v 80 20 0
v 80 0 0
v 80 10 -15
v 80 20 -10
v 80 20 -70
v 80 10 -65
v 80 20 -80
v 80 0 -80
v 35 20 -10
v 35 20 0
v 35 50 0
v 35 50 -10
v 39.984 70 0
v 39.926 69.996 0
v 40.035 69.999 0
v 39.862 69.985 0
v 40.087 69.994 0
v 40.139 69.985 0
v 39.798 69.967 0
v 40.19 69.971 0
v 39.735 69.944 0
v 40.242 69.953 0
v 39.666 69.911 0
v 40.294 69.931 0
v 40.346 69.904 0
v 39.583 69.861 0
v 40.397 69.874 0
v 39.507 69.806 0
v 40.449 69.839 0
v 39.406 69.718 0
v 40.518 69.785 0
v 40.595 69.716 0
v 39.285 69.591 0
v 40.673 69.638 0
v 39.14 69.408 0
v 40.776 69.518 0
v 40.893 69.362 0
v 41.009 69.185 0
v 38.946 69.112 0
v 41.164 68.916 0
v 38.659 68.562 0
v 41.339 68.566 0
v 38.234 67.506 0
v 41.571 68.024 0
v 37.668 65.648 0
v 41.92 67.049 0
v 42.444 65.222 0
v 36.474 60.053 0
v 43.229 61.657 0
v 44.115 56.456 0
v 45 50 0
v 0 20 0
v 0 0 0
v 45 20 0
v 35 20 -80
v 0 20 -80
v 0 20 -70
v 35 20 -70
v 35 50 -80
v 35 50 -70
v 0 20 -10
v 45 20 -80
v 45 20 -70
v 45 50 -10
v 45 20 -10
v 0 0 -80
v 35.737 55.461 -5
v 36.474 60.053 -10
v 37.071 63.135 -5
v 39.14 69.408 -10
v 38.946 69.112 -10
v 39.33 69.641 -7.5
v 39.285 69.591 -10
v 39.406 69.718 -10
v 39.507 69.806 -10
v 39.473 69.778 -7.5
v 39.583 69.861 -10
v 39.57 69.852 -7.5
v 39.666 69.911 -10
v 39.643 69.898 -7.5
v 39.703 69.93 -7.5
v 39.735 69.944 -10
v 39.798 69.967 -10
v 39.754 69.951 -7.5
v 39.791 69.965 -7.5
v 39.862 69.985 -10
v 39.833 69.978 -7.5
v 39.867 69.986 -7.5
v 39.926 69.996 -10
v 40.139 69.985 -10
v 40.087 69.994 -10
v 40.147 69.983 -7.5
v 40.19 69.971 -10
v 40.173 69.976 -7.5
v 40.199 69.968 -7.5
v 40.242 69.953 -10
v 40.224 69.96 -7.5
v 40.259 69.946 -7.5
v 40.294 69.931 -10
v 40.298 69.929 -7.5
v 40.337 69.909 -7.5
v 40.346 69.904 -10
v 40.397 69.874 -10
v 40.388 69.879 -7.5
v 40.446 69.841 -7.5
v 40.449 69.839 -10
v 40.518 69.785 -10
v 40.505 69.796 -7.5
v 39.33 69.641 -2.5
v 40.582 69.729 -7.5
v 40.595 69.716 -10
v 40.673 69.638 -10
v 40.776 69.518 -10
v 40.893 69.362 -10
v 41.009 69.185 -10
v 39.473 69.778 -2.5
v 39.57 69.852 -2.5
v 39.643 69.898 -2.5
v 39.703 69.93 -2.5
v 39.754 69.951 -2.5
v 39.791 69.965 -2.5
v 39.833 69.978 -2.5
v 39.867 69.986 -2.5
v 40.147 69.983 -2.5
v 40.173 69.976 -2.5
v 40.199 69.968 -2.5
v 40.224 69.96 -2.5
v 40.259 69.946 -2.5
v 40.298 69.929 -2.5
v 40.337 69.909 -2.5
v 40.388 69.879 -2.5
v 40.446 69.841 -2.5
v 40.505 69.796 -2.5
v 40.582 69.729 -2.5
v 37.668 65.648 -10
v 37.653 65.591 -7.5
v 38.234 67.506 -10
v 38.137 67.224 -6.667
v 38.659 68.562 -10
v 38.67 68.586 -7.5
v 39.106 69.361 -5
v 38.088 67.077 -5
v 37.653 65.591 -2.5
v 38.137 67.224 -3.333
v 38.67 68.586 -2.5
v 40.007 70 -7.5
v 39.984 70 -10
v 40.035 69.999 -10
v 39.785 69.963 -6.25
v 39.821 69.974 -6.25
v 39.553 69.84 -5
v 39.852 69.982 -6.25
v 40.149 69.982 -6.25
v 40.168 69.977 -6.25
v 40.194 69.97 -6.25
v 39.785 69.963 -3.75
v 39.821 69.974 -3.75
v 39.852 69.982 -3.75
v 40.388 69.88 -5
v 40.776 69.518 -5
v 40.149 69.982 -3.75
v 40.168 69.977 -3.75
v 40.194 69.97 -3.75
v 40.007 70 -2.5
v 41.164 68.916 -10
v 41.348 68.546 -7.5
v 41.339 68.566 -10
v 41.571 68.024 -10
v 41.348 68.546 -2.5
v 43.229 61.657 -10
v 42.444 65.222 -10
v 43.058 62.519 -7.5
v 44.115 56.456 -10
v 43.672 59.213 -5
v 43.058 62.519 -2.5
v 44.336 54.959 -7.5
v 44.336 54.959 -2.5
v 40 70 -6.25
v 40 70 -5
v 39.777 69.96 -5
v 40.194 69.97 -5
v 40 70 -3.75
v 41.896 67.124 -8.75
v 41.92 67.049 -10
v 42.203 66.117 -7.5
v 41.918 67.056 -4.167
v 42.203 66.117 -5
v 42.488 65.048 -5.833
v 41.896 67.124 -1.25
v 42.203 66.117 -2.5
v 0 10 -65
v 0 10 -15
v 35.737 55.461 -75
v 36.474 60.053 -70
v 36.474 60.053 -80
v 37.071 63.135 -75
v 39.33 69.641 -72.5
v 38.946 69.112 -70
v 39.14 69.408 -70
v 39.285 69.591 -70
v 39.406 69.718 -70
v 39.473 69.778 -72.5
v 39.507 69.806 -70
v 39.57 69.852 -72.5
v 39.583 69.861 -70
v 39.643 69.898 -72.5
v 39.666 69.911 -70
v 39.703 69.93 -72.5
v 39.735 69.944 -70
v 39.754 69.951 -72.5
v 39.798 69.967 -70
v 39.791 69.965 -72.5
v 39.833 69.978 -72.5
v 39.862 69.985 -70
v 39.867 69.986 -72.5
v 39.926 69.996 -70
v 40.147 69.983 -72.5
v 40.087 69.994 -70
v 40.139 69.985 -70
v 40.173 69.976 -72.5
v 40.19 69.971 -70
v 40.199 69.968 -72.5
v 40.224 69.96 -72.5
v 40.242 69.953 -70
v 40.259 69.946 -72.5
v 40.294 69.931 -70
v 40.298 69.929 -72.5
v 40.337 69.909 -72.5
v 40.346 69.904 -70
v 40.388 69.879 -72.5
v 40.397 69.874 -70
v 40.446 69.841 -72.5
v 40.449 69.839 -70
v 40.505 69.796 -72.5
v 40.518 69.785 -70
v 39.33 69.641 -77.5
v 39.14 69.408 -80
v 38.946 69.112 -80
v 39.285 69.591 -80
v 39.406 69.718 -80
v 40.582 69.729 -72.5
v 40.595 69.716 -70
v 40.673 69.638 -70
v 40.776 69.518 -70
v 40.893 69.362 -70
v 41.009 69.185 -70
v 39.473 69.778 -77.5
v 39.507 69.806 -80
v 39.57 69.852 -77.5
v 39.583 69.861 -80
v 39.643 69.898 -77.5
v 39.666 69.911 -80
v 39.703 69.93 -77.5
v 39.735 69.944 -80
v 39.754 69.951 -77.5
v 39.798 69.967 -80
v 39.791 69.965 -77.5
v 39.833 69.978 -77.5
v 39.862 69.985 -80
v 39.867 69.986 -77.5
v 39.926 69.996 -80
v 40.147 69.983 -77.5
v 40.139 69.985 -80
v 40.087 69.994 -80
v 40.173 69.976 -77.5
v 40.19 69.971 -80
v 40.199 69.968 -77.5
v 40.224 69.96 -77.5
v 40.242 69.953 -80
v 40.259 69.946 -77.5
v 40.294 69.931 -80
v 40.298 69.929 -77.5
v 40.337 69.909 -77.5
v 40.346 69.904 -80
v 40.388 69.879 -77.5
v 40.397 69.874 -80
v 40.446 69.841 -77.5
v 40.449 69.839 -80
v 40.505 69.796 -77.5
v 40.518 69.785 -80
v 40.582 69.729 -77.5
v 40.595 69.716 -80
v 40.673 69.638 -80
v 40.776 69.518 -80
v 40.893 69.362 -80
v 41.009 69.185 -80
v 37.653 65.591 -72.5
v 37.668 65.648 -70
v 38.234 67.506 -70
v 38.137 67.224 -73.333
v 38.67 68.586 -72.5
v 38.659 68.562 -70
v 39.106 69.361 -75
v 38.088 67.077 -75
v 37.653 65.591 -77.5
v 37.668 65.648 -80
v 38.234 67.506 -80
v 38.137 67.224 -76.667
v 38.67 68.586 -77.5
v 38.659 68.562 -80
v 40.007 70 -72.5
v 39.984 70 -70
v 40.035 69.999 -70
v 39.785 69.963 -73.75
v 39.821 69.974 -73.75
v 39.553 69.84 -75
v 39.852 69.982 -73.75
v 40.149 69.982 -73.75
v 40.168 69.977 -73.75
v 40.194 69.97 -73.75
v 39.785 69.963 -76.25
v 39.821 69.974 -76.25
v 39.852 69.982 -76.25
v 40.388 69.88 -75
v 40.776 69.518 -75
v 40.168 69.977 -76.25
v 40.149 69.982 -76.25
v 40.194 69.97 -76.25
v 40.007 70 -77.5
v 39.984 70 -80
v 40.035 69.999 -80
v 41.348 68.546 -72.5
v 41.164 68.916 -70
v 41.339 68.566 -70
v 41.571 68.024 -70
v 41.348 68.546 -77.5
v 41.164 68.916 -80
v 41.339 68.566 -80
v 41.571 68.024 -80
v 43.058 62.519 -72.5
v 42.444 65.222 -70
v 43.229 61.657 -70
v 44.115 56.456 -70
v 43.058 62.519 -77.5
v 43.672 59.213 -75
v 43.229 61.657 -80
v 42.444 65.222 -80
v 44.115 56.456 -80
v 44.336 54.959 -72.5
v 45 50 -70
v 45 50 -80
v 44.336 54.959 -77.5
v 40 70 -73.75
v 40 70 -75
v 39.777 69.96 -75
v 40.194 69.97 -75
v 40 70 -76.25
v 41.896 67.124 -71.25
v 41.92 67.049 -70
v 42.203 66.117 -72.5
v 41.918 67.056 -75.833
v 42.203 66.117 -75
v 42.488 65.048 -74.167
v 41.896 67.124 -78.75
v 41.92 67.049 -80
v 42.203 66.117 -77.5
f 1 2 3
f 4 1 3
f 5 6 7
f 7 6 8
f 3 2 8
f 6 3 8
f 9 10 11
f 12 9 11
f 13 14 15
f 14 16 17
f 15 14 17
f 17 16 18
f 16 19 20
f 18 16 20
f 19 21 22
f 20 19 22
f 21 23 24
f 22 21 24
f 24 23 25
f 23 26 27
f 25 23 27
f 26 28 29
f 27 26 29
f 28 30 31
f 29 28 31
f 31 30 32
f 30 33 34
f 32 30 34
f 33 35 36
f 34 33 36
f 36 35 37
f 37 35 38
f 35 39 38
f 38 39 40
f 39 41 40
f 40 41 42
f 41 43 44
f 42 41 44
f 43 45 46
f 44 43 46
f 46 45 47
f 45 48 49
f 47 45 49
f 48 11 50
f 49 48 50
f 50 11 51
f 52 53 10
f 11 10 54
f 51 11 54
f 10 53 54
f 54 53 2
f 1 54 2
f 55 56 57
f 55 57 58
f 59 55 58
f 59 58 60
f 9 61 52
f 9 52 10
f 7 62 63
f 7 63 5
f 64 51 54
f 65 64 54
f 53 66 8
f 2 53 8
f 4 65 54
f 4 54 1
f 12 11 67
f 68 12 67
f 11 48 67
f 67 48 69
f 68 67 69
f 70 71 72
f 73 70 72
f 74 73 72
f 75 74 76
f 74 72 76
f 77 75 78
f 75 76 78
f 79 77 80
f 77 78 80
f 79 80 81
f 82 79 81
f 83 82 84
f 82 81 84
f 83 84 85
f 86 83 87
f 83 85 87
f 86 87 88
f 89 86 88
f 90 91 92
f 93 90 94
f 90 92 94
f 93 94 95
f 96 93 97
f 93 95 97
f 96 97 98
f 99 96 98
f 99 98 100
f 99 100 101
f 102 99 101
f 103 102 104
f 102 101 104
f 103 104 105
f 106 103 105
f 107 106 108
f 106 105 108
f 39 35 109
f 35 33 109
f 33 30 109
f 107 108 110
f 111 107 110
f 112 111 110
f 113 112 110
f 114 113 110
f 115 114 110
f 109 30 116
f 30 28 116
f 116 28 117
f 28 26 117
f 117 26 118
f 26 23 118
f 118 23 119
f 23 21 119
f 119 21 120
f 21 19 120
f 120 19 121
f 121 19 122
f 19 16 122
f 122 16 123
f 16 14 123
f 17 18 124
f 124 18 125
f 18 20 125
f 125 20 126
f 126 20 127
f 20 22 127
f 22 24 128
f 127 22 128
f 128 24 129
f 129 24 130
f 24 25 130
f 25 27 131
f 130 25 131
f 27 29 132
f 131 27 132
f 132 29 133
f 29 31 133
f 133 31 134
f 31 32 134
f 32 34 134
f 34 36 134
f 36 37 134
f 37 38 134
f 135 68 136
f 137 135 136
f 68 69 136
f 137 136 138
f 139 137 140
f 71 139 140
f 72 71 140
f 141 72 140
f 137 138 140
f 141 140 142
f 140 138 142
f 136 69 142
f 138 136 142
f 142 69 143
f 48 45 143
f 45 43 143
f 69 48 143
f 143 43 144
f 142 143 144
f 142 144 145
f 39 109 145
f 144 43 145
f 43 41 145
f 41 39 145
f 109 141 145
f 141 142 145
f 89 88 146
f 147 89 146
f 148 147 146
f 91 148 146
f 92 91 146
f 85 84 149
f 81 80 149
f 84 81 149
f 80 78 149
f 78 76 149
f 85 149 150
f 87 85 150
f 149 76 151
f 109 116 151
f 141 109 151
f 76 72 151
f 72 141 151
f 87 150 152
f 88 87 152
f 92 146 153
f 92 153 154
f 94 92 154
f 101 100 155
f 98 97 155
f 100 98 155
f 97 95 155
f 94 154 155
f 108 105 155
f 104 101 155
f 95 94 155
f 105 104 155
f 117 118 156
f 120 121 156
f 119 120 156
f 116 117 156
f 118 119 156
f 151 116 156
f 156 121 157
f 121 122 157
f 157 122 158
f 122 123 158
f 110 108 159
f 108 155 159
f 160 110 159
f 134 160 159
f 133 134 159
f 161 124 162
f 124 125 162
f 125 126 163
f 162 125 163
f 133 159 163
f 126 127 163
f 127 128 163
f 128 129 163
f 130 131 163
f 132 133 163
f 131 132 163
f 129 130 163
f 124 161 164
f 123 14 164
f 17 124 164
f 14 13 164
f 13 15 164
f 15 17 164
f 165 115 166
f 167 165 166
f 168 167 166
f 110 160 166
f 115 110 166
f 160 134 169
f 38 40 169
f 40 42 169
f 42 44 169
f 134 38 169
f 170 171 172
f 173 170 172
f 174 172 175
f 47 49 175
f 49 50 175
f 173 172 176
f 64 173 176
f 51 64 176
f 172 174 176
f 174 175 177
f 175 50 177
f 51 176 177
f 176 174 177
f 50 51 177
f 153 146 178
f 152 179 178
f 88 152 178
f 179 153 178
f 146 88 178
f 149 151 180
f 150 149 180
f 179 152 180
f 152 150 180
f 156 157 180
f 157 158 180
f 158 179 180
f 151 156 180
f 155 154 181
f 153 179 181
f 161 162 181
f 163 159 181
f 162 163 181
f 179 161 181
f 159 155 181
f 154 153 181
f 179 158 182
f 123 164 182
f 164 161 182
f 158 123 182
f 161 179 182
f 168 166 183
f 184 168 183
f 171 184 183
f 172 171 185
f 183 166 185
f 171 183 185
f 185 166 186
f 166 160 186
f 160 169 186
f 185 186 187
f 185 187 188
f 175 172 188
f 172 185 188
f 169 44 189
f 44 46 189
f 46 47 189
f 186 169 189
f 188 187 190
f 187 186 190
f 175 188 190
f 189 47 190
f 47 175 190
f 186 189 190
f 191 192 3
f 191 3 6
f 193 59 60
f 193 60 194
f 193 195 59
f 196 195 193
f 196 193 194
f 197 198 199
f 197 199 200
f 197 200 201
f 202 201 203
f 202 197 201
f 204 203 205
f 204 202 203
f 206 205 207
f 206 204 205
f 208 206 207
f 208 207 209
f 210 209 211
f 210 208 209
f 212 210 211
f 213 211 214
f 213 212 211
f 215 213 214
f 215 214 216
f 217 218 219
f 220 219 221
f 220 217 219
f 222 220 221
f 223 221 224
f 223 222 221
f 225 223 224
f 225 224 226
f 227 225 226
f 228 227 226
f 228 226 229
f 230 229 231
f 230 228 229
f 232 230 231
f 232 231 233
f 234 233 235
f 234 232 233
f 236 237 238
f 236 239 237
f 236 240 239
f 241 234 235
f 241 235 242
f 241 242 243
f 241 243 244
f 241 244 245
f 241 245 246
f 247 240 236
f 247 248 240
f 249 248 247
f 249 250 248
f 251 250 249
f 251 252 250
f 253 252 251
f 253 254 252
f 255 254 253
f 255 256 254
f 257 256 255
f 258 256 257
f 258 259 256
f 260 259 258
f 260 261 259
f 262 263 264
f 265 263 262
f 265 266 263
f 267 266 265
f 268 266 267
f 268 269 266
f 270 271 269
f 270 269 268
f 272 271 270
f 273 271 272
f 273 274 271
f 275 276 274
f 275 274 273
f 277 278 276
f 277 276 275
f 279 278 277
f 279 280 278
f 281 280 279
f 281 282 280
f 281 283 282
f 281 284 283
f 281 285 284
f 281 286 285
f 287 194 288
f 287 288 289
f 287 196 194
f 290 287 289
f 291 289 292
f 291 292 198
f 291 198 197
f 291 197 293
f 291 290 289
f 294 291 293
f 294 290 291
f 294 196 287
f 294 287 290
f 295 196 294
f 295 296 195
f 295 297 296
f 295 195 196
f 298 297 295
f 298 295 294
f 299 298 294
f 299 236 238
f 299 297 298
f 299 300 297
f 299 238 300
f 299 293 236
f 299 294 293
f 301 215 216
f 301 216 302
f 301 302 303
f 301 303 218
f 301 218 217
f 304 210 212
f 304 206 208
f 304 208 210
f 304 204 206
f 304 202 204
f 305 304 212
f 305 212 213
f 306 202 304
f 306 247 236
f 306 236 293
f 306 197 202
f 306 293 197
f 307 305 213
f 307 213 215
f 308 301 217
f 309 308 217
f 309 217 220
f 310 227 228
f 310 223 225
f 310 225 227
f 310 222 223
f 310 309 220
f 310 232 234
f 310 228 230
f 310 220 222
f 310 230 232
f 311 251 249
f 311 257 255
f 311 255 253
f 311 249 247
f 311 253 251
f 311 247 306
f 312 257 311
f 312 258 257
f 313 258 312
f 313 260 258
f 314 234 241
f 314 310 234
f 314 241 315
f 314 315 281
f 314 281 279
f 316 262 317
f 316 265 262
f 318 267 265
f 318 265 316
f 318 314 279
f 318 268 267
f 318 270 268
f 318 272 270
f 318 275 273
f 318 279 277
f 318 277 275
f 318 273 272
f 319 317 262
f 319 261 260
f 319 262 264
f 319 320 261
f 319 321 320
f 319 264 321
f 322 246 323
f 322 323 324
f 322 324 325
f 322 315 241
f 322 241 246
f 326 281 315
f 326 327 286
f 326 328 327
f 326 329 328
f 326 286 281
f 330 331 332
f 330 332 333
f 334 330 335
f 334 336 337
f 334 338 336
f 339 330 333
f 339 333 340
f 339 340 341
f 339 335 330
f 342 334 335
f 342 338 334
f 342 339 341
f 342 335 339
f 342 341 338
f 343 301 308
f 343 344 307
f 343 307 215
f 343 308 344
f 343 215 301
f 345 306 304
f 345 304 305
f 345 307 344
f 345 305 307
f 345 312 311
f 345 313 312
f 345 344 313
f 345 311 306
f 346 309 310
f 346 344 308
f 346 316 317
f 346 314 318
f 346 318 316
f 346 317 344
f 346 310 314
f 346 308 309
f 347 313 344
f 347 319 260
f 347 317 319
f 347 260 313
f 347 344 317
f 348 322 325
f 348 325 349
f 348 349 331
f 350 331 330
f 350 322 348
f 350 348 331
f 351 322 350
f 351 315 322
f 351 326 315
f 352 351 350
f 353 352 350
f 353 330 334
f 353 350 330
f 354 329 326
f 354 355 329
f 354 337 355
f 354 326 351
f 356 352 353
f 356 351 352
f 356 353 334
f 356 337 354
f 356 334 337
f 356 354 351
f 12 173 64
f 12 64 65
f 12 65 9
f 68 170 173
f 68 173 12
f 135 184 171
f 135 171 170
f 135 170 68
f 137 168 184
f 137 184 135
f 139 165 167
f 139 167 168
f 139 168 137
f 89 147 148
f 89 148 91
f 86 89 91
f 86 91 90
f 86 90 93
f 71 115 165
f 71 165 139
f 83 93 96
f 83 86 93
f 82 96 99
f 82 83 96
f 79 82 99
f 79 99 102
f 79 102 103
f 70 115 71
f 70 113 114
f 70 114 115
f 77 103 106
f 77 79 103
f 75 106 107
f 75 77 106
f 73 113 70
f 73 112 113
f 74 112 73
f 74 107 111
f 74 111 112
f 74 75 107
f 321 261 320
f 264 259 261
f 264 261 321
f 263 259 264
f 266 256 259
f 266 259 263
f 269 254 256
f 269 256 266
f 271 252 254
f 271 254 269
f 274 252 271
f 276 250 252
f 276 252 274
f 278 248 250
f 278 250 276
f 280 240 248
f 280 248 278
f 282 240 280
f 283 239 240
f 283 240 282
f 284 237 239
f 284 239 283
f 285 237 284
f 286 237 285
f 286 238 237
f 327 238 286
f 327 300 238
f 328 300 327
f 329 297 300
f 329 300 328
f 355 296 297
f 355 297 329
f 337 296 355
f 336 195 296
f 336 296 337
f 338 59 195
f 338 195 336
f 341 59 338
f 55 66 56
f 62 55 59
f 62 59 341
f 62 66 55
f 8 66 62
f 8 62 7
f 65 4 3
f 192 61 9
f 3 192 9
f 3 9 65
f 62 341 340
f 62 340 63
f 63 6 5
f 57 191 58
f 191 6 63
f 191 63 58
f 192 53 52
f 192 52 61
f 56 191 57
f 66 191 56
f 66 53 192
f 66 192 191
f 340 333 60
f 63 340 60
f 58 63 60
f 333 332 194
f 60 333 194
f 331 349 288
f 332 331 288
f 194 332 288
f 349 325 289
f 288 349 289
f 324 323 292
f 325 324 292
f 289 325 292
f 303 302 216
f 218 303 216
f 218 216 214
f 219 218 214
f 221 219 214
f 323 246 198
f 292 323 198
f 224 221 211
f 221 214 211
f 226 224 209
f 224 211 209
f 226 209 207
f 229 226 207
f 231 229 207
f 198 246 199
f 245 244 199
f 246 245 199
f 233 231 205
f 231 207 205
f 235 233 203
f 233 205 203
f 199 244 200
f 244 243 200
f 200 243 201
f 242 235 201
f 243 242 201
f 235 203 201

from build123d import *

# Parameters (mm, degrees)
SKETCH2_W               = 80
SKETCH2_H               = 80
BOSS_EXTRUDE1_DEPTH     = 20
BOSS_EXTRUDE2_DEPTH     = 10
CUT_EXTRUDE1_DEPTH      = 134.041347129
CUT_EXTRUDE1_DEPTH_BACK = 134.041347129


with BuildPart() as part:
    # Sketch2 → Boss-Extrude1 (new body)
    with BuildSketch(Plane(origin=(0, 0, 0), x_dir=(1, 0, 0), z_dir=(0, 1, 0))):
        with Locations((40, 40)):
            Rectangle(SKETCH2_W, SKETCH2_H)
    extrude(amount=BOSS_EXTRUDE1_DEPTH)

    # Sketch3 → Boss-Extrude2 (add)
    with BuildSketch(Plane.XY):
        with BuildLine():
            Line((35, 20), (35, 50))
            add(Edge.make_bspline(
                [(35, 50), (40, 90), (45, 50)],
                knots=[0, 0, 0, 1, 1, 1], degree=2))
            Line((45, 50), (45, 20))
            Line((45, 20), (35, 20))
        make_face()
    boss_extrude2 = extrude(amount=-BOSS_EXTRUDE2_DEPTH)

    # Mirror1: Boss-Extrude2 across plane
    add(boss_extrude2.mirror(Plane.XY.offset(-40)))

    # Sketch4 → Cut-Extrude1 (cut, two sides: drawn at the far end of the back side and taken through both)
    with BuildSketch(Plane(origin=(80, 0, 0), x_dir=(0, 0, -1), z_dir=(1, 0, 0)).offset(-CUT_EXTRUDE1_DEPTH_BACK)):
        Polygon((70, 20), (10, 20), (15, 10), (65, 10), align=None)
    extrude(amount=CUT_EXTRUDE1_DEPTH + CUT_EXTRUDE1_DEPTH_BACK, mode=Mode.SUBTRACT)


solid = part.part
